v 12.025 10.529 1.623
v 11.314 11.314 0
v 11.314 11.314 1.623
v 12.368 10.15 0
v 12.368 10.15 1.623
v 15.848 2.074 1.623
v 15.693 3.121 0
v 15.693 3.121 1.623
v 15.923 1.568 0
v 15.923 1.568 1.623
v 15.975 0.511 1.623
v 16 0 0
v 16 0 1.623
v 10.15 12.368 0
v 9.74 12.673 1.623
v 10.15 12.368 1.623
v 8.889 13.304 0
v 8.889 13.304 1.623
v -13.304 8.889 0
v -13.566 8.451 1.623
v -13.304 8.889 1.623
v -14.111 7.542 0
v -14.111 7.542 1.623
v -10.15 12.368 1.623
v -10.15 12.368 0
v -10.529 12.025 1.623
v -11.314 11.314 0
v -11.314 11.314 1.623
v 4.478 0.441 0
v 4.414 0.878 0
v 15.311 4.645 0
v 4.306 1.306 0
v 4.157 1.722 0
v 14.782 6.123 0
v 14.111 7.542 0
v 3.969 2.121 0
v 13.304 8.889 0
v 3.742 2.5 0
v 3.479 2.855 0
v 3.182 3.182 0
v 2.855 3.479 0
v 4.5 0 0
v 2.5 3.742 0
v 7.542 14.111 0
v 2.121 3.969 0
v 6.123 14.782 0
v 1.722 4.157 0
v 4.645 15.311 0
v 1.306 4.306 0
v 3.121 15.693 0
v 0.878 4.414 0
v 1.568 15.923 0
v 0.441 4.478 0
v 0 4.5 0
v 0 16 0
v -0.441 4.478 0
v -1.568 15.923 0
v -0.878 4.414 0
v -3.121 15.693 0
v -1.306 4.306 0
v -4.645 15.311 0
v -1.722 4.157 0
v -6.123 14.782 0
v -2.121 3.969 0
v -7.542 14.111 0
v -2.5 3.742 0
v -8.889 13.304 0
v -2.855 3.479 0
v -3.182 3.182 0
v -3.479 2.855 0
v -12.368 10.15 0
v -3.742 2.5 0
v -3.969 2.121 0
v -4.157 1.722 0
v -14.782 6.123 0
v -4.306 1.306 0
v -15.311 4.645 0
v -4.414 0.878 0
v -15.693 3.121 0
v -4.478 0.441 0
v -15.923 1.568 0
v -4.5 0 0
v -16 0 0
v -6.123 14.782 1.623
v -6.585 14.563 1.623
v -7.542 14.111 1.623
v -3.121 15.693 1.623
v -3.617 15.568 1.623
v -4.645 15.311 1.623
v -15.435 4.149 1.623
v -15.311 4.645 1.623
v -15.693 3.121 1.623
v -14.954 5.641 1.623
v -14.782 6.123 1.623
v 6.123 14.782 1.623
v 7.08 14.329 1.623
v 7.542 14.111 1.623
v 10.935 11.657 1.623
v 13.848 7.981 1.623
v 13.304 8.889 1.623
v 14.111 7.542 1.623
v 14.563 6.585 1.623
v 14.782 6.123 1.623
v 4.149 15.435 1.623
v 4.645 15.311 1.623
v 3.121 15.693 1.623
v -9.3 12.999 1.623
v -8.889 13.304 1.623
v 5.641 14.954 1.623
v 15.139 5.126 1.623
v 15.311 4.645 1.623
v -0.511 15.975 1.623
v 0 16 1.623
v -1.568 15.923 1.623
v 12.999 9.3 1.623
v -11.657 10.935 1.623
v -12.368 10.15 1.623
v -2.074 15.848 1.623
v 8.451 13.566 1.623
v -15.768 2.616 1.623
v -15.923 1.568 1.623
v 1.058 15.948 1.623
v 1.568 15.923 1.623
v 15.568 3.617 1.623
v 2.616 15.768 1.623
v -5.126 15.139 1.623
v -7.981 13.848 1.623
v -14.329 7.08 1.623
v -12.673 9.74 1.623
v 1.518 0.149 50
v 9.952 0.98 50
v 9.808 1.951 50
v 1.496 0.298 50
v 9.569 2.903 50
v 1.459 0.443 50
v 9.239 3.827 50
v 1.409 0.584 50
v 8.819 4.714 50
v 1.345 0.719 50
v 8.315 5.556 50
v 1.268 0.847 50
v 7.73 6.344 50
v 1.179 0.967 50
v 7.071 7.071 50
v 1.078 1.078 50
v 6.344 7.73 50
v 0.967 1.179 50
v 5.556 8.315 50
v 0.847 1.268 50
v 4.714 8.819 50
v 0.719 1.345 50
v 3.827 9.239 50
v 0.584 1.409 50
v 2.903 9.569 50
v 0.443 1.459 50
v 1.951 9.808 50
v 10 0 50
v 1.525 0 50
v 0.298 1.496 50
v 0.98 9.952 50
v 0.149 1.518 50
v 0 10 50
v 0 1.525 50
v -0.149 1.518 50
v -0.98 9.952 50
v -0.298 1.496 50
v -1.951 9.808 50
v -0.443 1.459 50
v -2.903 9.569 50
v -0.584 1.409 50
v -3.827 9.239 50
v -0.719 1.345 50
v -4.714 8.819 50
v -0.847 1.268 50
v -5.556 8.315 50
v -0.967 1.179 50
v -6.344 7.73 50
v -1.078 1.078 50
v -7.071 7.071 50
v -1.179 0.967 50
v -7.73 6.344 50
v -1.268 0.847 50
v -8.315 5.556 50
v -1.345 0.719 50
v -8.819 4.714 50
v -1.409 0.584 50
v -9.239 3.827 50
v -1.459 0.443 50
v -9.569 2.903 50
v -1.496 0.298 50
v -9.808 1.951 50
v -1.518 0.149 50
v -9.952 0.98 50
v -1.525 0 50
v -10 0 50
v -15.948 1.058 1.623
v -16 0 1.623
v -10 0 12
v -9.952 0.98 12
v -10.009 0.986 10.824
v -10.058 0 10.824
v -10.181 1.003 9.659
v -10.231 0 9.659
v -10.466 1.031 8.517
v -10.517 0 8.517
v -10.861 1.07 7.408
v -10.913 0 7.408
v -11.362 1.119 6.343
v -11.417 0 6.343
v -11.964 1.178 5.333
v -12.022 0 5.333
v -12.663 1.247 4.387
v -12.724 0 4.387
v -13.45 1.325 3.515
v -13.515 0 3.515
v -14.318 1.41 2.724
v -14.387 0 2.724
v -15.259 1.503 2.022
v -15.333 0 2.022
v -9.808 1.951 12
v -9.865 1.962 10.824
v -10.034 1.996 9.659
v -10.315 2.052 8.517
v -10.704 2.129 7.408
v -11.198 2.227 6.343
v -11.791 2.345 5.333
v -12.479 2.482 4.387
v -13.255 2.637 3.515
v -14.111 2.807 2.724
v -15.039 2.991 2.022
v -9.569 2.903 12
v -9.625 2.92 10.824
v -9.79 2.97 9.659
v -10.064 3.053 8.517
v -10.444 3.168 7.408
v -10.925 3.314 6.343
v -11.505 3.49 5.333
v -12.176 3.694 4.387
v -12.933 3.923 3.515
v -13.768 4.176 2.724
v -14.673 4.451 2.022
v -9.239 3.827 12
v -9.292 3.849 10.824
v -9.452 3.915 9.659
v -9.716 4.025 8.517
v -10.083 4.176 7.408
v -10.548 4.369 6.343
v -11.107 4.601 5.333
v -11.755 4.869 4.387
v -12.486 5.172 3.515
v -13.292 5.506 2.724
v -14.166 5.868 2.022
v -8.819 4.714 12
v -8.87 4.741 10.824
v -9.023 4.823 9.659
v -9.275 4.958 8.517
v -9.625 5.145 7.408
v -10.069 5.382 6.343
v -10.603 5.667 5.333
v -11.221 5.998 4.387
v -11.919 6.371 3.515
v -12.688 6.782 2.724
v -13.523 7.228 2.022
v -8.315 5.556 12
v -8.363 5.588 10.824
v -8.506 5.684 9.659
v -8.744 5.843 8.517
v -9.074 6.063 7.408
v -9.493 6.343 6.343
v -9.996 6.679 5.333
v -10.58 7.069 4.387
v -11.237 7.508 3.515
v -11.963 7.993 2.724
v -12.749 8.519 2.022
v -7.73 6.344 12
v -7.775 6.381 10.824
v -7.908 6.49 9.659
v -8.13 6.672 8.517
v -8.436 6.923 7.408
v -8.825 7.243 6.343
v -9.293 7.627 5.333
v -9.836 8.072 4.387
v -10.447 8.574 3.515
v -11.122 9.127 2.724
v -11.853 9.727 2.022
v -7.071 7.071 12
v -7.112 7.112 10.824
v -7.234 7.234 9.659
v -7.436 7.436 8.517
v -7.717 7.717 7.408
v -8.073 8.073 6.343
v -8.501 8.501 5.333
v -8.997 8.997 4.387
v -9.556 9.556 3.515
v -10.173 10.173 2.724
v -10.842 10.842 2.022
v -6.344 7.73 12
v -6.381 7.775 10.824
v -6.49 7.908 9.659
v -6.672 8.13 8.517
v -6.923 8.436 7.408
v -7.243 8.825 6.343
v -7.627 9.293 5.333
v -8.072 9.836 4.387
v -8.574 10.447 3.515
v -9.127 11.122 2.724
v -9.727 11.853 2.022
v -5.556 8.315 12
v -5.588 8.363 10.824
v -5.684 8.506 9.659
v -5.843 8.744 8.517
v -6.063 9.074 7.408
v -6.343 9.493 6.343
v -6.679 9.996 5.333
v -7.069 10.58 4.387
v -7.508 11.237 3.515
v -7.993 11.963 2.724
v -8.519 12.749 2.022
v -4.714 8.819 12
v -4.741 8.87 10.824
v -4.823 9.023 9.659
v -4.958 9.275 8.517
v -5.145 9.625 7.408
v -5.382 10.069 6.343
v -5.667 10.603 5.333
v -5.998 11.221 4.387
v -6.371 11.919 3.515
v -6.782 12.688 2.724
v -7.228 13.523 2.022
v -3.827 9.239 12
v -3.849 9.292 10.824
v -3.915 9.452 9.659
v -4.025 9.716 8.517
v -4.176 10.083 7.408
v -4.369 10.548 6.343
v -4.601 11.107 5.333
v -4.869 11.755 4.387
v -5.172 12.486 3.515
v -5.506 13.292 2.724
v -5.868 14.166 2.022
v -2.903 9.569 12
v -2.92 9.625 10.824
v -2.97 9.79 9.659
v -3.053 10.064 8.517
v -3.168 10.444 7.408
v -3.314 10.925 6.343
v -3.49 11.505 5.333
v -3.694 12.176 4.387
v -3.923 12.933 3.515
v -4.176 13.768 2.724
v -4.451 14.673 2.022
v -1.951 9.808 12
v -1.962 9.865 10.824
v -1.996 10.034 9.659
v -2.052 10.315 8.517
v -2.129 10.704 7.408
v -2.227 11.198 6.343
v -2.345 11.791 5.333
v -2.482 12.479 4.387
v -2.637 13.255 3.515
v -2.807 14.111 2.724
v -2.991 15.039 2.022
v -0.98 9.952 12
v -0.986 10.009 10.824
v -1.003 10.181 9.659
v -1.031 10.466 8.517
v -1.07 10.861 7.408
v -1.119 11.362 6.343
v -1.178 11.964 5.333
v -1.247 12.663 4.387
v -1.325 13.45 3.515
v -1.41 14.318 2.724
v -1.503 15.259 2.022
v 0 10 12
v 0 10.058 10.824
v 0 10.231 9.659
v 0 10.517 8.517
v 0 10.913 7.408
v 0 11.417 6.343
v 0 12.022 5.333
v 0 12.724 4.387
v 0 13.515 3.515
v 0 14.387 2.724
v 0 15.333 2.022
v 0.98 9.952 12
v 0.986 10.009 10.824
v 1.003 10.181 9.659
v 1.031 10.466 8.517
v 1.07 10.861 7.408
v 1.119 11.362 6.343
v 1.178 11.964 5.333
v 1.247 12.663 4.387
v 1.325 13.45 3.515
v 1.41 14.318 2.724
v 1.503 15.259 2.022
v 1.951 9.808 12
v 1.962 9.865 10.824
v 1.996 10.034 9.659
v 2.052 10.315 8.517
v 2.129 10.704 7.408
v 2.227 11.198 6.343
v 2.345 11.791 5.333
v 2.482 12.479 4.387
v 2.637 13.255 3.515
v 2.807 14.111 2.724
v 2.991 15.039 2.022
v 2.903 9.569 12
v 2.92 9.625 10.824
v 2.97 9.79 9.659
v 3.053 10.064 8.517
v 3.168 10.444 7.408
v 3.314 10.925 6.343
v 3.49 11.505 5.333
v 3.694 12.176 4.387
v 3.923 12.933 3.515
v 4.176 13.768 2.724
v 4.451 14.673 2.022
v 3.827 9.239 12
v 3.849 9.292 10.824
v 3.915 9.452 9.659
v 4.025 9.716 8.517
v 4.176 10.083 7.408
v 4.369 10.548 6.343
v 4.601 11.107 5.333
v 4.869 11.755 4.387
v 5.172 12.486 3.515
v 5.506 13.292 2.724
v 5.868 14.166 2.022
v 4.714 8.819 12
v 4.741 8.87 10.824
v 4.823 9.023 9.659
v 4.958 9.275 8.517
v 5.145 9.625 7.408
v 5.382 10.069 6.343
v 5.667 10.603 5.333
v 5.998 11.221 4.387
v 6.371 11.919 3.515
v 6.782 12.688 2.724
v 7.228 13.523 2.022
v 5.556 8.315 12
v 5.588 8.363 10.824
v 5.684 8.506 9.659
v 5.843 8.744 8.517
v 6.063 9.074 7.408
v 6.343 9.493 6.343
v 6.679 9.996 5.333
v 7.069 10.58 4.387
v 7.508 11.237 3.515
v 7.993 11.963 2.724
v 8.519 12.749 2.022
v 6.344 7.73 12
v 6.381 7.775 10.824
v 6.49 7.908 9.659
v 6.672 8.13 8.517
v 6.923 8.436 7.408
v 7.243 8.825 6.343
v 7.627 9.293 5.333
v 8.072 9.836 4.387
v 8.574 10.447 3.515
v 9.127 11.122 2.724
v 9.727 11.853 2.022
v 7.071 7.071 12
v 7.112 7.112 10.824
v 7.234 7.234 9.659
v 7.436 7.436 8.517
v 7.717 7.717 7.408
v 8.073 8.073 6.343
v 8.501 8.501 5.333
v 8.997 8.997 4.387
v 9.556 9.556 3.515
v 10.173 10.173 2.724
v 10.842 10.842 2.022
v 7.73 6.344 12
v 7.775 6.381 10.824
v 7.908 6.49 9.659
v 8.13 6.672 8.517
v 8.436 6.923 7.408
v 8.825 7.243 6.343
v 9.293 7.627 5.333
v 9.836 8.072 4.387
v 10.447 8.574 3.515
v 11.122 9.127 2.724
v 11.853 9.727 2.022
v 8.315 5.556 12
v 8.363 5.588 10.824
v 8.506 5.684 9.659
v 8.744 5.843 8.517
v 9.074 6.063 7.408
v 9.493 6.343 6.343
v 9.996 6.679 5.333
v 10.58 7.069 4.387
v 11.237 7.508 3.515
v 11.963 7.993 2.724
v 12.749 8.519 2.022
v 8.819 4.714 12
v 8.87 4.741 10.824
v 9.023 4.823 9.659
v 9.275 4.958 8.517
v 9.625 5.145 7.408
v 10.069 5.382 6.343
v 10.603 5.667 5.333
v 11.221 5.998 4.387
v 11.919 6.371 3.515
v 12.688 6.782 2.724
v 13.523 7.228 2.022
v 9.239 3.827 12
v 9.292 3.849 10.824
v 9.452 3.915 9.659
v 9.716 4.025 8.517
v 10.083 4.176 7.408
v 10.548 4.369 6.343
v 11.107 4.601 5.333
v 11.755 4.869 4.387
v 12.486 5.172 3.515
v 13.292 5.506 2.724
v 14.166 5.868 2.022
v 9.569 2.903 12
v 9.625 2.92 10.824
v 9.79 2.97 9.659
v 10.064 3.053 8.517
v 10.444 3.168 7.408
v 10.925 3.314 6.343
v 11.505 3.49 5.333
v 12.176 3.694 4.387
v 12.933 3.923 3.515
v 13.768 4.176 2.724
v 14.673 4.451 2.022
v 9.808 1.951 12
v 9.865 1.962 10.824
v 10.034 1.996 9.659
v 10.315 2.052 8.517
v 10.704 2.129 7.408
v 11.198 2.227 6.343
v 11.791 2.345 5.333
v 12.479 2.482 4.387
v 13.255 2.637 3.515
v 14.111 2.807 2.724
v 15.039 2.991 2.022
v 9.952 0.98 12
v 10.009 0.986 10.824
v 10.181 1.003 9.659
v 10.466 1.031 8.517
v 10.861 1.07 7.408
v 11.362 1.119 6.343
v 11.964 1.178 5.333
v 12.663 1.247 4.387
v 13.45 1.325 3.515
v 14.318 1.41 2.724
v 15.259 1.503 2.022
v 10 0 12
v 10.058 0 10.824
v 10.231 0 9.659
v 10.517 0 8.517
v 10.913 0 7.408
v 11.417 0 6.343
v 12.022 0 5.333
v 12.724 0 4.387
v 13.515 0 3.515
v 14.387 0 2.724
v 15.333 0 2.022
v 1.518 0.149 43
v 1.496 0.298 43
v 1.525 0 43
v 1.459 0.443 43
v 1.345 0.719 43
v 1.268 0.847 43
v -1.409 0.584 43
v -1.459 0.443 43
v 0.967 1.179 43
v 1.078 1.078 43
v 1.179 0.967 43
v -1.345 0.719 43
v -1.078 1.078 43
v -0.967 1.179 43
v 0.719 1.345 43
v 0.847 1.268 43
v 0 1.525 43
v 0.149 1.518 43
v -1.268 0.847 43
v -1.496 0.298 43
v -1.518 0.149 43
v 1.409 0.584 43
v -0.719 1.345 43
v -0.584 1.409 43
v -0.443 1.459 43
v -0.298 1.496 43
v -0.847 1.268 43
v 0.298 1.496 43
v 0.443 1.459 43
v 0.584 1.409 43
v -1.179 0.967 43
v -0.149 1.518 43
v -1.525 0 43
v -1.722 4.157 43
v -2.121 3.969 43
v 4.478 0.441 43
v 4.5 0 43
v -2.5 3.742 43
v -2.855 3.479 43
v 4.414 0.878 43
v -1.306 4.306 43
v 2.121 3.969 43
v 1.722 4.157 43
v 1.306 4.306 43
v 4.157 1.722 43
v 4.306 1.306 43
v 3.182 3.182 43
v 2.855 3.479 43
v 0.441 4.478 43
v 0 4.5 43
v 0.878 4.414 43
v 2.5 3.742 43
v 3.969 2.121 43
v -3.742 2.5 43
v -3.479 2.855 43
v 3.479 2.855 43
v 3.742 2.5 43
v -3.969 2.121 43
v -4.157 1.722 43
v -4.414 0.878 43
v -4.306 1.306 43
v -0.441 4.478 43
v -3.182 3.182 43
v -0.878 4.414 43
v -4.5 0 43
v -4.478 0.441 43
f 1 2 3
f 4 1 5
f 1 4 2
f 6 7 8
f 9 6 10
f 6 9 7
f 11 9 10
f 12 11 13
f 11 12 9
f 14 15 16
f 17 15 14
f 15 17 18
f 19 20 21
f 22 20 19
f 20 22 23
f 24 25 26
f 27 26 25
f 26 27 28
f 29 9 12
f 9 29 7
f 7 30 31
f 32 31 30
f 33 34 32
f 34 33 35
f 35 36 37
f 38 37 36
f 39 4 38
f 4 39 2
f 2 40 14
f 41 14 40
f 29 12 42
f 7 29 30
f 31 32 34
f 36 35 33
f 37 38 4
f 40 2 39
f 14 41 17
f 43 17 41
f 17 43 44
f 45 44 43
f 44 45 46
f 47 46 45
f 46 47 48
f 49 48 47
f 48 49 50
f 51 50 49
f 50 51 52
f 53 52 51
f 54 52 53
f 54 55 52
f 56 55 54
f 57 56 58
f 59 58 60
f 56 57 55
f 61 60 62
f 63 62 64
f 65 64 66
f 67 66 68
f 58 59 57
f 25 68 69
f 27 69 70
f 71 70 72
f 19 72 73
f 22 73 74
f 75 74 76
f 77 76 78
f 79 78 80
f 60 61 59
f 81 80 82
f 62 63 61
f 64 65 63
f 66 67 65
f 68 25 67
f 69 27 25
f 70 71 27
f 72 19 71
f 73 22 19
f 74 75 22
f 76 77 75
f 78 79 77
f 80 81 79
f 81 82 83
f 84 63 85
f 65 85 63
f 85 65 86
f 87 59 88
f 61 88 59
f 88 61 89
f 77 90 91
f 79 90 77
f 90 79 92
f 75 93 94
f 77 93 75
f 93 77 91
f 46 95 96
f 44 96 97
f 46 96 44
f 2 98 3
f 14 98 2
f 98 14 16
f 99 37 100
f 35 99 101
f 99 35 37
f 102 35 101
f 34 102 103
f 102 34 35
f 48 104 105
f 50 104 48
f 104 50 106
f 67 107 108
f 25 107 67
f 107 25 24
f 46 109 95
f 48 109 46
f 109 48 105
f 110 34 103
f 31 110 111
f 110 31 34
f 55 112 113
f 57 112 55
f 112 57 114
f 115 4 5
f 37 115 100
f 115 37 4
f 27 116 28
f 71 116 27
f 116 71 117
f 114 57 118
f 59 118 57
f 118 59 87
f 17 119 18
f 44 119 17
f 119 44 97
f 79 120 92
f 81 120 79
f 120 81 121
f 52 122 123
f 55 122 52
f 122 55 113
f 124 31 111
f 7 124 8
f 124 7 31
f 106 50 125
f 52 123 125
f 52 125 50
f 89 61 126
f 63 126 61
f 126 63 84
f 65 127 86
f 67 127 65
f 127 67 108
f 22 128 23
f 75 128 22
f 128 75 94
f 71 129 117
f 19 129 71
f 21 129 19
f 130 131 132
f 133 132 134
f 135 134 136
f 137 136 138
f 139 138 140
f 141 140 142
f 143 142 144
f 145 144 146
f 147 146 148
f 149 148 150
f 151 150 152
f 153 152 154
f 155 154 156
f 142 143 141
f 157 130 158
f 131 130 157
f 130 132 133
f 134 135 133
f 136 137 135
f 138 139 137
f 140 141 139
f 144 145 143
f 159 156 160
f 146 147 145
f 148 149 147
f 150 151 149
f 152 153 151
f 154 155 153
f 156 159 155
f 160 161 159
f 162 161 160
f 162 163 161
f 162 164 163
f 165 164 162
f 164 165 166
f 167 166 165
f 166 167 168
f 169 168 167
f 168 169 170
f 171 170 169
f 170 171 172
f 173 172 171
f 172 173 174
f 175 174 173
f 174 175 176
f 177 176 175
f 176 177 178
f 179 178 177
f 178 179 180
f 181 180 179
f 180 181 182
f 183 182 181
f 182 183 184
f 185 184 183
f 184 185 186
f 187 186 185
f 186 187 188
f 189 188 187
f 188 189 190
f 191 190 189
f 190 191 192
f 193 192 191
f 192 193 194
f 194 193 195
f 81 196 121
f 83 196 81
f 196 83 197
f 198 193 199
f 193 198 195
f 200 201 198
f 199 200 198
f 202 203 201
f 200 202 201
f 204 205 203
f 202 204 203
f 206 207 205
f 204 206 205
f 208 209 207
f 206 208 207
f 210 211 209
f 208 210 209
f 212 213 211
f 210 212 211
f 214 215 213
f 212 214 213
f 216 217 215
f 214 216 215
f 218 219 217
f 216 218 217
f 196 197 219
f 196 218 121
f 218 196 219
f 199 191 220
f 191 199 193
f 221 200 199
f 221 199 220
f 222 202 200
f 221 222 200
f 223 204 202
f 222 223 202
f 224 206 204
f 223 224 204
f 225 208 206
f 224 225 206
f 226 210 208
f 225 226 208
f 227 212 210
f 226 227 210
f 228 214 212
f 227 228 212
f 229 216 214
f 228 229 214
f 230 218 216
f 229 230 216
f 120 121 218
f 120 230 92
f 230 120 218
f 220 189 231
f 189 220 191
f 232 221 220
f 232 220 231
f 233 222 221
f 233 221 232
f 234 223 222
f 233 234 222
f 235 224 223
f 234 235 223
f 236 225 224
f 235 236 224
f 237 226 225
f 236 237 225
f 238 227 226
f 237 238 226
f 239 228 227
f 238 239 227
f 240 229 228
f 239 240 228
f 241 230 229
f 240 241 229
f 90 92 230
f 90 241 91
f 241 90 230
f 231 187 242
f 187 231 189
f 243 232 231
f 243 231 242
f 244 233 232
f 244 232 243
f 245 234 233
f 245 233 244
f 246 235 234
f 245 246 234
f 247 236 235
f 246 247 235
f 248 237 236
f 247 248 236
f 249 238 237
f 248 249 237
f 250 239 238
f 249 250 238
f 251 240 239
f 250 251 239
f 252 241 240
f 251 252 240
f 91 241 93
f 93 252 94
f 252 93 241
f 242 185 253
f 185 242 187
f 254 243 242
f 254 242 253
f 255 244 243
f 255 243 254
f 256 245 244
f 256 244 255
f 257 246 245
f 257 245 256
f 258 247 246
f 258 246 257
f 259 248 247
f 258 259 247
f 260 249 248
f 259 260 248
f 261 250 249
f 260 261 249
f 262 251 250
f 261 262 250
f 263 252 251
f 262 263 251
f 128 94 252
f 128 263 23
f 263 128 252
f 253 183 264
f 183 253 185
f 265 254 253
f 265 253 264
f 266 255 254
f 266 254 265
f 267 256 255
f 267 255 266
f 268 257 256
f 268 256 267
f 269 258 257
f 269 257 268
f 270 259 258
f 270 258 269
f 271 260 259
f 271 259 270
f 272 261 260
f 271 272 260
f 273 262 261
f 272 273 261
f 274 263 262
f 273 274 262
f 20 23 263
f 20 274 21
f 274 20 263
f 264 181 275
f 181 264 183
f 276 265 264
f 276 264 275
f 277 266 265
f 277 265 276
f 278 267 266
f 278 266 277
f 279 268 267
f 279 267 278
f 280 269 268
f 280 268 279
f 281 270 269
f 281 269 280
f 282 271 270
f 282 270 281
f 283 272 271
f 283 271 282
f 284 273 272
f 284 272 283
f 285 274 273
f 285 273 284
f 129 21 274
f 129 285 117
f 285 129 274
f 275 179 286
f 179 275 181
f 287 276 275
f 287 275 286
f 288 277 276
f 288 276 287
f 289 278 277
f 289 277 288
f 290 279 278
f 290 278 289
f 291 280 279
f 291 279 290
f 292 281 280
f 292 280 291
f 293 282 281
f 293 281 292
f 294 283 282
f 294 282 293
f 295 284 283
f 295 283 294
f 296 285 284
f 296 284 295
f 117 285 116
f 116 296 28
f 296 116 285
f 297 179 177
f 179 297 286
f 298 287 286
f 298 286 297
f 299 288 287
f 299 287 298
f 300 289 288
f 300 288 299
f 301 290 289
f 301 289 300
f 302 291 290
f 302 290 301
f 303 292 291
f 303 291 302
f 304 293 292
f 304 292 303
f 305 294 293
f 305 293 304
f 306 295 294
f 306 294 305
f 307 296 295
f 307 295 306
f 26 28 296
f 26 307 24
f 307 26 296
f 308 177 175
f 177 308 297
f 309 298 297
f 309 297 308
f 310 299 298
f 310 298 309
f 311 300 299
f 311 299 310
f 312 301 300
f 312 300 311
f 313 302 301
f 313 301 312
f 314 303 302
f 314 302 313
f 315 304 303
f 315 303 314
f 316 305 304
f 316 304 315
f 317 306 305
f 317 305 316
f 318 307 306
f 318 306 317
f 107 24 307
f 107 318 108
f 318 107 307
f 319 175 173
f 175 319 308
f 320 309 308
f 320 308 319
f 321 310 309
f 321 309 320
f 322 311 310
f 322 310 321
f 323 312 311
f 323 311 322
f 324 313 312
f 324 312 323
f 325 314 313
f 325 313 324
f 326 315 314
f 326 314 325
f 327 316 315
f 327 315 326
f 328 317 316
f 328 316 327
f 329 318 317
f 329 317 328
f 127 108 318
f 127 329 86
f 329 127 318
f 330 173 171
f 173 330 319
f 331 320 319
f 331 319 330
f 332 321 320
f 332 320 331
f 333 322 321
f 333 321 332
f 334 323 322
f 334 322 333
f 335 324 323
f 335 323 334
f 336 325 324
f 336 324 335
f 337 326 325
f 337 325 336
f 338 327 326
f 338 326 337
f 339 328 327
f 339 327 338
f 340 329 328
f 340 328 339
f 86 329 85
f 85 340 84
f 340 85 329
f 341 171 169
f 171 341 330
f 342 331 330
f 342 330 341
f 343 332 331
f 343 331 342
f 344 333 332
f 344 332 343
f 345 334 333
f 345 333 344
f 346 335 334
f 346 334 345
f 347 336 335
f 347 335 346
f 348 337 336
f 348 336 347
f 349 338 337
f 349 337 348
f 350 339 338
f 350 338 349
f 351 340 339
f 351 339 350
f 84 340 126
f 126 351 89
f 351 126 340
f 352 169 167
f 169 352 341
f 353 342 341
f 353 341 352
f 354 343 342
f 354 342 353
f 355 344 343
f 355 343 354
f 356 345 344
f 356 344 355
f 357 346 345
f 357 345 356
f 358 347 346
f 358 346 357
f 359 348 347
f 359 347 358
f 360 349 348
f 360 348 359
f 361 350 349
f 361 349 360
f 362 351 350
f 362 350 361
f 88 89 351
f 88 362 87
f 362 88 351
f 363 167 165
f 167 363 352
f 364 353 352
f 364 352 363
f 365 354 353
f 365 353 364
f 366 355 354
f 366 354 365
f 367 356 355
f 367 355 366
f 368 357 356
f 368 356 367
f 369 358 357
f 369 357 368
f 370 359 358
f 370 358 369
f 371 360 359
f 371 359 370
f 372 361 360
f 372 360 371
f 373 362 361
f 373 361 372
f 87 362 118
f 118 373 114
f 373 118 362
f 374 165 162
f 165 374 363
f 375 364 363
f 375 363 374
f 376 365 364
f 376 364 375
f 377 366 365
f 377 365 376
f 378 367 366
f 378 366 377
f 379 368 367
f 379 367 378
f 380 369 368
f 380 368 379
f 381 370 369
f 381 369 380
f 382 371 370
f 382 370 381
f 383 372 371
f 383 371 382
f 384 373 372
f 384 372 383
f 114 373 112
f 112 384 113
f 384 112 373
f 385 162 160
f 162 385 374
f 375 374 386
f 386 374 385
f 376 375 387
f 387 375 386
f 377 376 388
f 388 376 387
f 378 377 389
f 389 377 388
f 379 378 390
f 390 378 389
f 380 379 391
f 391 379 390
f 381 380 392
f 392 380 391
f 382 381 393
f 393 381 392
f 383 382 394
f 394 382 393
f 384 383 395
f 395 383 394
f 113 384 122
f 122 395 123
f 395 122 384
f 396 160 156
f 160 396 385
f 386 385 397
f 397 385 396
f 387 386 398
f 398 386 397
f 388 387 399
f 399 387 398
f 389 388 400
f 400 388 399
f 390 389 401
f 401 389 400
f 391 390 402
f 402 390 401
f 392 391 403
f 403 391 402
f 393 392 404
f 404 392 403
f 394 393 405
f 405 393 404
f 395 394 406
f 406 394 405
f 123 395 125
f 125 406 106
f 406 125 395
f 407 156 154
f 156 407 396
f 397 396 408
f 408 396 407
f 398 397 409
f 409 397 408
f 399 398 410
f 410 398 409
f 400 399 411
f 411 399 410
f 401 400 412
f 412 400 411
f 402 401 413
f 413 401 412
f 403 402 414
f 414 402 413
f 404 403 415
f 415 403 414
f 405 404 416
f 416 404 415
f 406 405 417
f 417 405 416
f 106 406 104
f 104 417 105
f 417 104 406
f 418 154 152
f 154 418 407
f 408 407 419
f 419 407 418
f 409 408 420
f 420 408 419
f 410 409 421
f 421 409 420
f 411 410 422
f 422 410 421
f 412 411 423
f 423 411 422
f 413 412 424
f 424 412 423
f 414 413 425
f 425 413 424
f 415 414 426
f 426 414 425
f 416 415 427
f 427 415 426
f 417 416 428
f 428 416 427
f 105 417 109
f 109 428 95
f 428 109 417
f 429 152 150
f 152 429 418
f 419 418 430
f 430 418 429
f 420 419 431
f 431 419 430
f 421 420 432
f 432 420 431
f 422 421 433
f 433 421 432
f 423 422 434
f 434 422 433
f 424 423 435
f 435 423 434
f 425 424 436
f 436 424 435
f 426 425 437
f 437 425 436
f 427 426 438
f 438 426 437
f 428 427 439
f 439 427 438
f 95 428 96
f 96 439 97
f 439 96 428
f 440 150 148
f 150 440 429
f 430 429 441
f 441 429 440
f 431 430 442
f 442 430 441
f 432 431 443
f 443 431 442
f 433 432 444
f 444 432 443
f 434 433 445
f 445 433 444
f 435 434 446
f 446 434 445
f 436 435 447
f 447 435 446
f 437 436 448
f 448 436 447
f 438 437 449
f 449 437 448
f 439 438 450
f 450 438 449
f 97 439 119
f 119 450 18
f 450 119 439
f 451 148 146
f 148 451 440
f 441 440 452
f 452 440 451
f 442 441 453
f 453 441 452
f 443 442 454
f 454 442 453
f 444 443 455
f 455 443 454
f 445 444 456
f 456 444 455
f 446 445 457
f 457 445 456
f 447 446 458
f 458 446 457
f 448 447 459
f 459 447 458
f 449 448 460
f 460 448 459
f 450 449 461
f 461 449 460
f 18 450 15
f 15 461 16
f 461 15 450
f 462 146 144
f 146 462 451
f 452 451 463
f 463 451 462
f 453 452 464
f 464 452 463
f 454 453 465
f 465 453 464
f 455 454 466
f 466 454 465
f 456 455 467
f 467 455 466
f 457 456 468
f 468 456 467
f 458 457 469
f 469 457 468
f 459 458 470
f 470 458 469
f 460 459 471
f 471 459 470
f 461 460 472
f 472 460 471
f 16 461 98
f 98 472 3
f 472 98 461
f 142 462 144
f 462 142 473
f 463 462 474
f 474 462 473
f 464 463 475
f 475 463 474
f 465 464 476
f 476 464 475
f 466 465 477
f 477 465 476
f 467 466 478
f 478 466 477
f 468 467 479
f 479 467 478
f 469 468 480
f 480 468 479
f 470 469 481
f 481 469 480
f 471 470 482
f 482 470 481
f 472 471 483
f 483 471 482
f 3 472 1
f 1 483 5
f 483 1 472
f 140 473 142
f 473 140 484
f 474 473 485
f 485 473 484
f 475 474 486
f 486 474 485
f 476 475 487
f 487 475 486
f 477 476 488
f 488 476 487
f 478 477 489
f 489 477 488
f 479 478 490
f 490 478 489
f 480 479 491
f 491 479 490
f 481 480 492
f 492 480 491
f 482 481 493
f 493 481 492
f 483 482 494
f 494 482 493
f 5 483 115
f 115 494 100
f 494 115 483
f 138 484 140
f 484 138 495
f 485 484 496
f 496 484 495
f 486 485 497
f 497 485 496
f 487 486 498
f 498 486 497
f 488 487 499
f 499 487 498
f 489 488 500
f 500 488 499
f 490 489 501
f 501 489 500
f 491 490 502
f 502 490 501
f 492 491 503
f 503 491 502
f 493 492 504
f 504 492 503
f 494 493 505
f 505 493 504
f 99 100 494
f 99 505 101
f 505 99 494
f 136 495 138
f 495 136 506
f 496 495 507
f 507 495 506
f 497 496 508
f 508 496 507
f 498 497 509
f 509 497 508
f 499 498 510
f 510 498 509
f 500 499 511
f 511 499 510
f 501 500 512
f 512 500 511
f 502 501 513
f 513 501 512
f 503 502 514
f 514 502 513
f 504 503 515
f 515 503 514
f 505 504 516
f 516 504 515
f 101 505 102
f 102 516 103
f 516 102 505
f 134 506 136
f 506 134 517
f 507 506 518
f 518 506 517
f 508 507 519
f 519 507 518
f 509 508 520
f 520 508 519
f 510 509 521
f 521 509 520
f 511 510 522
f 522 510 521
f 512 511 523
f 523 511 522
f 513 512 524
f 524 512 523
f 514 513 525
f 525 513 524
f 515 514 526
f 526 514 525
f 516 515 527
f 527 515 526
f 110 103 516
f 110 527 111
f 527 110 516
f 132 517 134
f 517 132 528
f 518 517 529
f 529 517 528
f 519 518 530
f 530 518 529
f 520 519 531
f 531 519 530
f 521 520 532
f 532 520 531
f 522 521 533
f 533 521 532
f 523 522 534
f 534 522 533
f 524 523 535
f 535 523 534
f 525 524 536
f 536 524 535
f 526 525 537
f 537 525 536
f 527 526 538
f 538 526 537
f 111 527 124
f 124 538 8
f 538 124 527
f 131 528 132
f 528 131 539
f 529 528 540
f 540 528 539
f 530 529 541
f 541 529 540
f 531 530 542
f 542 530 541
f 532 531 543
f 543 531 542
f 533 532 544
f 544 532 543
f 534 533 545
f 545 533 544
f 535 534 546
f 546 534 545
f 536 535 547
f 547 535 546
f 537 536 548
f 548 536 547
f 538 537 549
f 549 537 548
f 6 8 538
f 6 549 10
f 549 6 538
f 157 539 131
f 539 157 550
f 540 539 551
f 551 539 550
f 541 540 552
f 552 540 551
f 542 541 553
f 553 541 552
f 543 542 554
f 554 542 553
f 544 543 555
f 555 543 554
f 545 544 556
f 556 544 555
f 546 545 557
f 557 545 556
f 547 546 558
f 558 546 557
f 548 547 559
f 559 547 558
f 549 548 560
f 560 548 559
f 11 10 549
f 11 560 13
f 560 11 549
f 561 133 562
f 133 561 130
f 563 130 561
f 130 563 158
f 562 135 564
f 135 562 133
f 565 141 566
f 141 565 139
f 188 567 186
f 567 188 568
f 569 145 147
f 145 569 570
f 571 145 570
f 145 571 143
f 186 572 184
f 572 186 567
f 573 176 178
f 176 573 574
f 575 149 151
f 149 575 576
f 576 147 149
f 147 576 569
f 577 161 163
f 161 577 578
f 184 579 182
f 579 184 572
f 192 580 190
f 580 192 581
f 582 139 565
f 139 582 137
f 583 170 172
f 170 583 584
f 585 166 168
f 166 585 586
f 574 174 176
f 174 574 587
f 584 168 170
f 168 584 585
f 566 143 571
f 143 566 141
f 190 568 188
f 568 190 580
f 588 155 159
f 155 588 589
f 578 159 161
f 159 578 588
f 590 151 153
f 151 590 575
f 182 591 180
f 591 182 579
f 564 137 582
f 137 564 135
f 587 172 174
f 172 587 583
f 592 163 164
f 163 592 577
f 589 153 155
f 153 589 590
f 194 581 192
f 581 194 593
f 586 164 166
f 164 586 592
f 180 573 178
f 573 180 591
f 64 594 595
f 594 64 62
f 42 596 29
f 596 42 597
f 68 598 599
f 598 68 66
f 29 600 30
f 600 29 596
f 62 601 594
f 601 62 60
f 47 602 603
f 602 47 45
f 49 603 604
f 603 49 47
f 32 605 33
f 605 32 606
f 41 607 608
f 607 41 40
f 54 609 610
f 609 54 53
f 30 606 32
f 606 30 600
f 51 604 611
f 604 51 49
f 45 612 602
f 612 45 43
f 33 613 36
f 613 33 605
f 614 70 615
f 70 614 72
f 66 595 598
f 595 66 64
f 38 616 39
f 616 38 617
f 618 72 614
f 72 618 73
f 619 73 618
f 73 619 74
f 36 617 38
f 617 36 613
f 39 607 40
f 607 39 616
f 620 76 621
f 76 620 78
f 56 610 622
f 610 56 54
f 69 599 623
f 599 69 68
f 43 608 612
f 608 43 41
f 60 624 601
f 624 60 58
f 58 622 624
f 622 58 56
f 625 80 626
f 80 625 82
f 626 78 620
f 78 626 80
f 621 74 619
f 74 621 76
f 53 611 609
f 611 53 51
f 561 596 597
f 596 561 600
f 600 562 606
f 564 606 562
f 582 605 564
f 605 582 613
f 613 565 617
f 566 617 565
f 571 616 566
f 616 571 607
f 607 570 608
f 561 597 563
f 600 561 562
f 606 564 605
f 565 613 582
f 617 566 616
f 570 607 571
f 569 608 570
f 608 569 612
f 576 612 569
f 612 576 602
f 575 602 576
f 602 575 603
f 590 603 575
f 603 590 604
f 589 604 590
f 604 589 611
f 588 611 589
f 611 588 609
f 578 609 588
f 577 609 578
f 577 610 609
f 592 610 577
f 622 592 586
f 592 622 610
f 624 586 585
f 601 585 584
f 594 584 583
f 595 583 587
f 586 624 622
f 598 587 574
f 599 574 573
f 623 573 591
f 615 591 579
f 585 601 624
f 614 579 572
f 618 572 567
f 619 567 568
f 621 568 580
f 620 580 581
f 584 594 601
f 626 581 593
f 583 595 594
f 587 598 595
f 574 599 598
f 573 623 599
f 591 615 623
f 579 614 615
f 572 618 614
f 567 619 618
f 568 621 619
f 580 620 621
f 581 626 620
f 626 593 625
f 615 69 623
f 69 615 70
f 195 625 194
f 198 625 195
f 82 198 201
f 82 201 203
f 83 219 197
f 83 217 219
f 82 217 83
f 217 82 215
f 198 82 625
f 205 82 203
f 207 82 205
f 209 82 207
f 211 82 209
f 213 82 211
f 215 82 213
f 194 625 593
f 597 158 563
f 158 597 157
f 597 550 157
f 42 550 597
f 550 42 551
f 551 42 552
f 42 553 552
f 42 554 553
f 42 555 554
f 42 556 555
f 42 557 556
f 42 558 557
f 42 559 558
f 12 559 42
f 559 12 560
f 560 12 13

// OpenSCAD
//---------------------------------------------------------------
//-- CUSTOMIZER PARAMETERS
//---------------------------------------------------------------


// - Pillar height
Pillar_Height = 50;
// - Pillar external diameter
Pillar_ext_dia = 20;
// - Pillar internal diameter
Pillar_int_dia = 3.05; // M3
// - Pillar base hole diameter
Pillar_bh_dia = 9;
// - Pillar Fillet
Pillar_Fillet = 12;
// - Pillar top thickness
Pillar_top_thick = 7;


Pillar_bh_height = Pillar_Height - Pillar_top_thick;


//---------------------------------------------------------------
//-- MODULES
//---------------------------------------------------------------



module Bpillar(pillar_height, ext_diameter, int_diameter, base_hole_diameter, base_hole_height, pillar_Fillet){
    translate([0, 0, 0])
     difference() {
        cylinder(d = ext_diameter + pillar_Fillet, h = pillar_height, $fn=64);
        rotate_extrude($fn = 64) {
          translate([(ext_diameter + pillar_Fillet * 2)/2, pillar_Fillet, 0]) {
            minkowski(){
              square(pillar_height);
              circle(pillar_Fillet, $fn=64);
            }
          }
        }
    cylinder(d = int_diameter, h = pillar_height, $fn = 64);
    color("red") 
      translate([0, 0, 0])
        cylinder(d = base_hole_diameter, h = base_hole_height, $fn = 64);
    }
} 



//---------------------------------------------------------------
//-- RENDERS
//---------------------------------------------------------------


difference() {
Bpillar(pillar_height = Pillar_Height, ext_diameter = Pillar_ext_dia, int_diameter = Pillar_int_dia, base_hole_diameter = Pillar_bh_dia, base_hole_height = Pillar_bh_height, pillar_Fillet = Pillar_Fillet);    
translate([0, -50, 0]) cube([100, 100, 100], center = true);
}
